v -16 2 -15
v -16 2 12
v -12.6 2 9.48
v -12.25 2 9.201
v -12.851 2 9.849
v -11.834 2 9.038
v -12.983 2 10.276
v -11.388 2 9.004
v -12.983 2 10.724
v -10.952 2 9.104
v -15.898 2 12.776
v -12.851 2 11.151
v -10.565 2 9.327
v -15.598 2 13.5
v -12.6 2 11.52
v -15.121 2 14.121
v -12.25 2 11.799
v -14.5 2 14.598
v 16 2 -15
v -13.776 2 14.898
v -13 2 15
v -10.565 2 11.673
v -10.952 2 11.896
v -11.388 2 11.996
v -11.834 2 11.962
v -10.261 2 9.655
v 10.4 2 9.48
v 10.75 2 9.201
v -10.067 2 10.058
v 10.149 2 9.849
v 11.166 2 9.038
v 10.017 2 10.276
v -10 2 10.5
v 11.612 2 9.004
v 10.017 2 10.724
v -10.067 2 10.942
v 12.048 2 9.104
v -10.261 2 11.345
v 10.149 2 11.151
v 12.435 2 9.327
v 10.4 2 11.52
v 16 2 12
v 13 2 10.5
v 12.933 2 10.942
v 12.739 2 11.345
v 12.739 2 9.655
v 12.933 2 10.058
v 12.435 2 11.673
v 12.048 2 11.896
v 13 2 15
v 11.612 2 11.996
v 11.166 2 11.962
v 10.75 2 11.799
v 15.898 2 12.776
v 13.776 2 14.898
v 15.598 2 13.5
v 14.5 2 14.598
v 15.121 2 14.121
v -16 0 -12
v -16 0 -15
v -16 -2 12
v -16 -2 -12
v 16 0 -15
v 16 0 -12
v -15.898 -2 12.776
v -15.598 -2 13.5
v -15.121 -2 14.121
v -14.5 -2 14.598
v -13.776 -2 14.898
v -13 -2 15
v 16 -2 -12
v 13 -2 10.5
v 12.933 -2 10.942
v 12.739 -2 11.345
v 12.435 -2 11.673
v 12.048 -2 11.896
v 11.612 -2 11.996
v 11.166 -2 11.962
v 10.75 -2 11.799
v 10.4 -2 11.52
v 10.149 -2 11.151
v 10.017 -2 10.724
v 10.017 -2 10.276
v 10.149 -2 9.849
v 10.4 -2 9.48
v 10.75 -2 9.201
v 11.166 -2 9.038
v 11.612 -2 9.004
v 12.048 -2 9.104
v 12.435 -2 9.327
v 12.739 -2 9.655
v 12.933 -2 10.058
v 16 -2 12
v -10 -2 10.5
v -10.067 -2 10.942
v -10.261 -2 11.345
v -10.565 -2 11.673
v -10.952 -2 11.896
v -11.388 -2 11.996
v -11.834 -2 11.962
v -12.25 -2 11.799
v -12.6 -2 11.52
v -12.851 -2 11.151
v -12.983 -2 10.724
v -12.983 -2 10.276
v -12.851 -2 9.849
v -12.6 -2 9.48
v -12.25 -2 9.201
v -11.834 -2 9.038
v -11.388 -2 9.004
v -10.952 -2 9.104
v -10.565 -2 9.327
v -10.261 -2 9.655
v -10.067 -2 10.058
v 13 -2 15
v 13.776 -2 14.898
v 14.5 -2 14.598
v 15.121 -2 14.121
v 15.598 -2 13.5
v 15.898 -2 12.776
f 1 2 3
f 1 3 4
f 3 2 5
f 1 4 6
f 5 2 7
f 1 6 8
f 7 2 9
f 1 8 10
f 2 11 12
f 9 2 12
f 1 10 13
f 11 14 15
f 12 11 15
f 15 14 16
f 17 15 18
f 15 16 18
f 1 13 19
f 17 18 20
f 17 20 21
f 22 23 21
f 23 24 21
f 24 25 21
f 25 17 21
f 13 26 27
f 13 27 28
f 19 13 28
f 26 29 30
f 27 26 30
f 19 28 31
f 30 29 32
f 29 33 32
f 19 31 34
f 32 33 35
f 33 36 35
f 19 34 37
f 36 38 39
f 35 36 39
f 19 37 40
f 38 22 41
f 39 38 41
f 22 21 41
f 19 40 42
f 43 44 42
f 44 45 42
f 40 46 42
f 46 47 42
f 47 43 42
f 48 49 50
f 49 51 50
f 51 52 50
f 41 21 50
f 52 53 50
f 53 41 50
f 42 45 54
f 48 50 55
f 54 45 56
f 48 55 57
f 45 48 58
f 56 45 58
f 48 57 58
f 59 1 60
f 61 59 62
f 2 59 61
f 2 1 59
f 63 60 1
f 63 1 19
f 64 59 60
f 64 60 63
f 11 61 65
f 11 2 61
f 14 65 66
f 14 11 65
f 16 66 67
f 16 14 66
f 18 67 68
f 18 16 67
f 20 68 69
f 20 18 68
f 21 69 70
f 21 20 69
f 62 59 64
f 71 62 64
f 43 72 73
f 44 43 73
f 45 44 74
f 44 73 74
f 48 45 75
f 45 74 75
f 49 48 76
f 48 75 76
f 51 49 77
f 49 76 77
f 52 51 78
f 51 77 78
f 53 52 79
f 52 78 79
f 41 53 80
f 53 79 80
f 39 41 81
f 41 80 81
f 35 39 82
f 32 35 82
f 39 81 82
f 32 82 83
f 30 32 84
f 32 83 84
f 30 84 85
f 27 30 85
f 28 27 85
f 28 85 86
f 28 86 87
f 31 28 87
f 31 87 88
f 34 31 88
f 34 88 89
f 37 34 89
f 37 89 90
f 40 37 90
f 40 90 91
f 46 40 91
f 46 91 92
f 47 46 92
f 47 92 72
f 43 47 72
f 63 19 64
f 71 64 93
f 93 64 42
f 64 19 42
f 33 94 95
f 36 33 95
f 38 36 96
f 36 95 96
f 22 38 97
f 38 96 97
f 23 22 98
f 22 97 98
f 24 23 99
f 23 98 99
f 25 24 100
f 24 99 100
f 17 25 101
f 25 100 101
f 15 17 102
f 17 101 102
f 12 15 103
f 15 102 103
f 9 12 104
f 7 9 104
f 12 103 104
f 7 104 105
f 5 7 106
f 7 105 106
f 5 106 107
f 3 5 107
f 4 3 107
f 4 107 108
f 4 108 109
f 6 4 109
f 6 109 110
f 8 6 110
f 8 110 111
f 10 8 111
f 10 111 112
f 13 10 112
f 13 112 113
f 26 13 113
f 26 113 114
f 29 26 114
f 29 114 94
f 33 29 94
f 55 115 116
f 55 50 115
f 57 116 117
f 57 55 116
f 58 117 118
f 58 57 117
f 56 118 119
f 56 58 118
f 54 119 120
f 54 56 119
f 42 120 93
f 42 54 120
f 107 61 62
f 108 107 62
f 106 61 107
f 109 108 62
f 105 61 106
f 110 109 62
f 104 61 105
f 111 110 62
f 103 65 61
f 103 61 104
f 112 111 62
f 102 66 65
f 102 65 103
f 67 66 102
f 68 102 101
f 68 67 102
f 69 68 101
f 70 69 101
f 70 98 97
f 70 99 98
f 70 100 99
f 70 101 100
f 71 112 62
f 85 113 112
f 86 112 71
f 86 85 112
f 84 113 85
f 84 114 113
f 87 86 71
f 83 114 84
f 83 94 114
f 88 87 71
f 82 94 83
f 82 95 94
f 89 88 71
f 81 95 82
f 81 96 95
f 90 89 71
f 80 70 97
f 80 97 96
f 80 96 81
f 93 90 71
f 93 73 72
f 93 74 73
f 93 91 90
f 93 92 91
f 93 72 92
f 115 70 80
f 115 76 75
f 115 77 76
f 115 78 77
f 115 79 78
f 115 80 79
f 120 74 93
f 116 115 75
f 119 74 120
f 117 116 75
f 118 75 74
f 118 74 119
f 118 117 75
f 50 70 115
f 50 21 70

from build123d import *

# Parameters (mm, degrees)
F0_W     = 32
F0_H     = 30
F1_DEPTH = 2
F2_W     = 32
F2_H     = 27
F3_DEPTH = 2
F4_R     = 1.5
F5_DEPTH = 4.001
F6_R     = 3


with BuildPart() as f1:
    # F0 (on Front) → F1 (new body)
    with BuildSketch(Plane.XZ):
        Rectangle(F0_W, F0_H)
    extrude(amount=-F1_DEPTH)

    # F2 (on face) → F3 (join)
    with BuildSketch(Plane.XZ):
        with Locations((0, 1.5)):
            Rectangle(F2_W, F2_H)
    extrude(amount=F3_DEPTH)

    # F4 (on face) → F5 (cut, through all)
    with BuildSketch(Plane.XZ.offset(2)):
        with Locations((-11.5, 10.5)):
            Circle(F4_R)
        with Locations((11.5, 10.5)):
            Circle(F4_R)
    extrude(amount=-F5_DEPTH, mode=Mode.SUBTRACT)

    # F6
    f6_edges = [f1.edges().sort_by_distance(p)[0] for p in [
        (-16, 0, 15),
        (16, 0, 15),
    ]]
    fillet(f6_edges, radius=F6_R)


solid = f1.part
